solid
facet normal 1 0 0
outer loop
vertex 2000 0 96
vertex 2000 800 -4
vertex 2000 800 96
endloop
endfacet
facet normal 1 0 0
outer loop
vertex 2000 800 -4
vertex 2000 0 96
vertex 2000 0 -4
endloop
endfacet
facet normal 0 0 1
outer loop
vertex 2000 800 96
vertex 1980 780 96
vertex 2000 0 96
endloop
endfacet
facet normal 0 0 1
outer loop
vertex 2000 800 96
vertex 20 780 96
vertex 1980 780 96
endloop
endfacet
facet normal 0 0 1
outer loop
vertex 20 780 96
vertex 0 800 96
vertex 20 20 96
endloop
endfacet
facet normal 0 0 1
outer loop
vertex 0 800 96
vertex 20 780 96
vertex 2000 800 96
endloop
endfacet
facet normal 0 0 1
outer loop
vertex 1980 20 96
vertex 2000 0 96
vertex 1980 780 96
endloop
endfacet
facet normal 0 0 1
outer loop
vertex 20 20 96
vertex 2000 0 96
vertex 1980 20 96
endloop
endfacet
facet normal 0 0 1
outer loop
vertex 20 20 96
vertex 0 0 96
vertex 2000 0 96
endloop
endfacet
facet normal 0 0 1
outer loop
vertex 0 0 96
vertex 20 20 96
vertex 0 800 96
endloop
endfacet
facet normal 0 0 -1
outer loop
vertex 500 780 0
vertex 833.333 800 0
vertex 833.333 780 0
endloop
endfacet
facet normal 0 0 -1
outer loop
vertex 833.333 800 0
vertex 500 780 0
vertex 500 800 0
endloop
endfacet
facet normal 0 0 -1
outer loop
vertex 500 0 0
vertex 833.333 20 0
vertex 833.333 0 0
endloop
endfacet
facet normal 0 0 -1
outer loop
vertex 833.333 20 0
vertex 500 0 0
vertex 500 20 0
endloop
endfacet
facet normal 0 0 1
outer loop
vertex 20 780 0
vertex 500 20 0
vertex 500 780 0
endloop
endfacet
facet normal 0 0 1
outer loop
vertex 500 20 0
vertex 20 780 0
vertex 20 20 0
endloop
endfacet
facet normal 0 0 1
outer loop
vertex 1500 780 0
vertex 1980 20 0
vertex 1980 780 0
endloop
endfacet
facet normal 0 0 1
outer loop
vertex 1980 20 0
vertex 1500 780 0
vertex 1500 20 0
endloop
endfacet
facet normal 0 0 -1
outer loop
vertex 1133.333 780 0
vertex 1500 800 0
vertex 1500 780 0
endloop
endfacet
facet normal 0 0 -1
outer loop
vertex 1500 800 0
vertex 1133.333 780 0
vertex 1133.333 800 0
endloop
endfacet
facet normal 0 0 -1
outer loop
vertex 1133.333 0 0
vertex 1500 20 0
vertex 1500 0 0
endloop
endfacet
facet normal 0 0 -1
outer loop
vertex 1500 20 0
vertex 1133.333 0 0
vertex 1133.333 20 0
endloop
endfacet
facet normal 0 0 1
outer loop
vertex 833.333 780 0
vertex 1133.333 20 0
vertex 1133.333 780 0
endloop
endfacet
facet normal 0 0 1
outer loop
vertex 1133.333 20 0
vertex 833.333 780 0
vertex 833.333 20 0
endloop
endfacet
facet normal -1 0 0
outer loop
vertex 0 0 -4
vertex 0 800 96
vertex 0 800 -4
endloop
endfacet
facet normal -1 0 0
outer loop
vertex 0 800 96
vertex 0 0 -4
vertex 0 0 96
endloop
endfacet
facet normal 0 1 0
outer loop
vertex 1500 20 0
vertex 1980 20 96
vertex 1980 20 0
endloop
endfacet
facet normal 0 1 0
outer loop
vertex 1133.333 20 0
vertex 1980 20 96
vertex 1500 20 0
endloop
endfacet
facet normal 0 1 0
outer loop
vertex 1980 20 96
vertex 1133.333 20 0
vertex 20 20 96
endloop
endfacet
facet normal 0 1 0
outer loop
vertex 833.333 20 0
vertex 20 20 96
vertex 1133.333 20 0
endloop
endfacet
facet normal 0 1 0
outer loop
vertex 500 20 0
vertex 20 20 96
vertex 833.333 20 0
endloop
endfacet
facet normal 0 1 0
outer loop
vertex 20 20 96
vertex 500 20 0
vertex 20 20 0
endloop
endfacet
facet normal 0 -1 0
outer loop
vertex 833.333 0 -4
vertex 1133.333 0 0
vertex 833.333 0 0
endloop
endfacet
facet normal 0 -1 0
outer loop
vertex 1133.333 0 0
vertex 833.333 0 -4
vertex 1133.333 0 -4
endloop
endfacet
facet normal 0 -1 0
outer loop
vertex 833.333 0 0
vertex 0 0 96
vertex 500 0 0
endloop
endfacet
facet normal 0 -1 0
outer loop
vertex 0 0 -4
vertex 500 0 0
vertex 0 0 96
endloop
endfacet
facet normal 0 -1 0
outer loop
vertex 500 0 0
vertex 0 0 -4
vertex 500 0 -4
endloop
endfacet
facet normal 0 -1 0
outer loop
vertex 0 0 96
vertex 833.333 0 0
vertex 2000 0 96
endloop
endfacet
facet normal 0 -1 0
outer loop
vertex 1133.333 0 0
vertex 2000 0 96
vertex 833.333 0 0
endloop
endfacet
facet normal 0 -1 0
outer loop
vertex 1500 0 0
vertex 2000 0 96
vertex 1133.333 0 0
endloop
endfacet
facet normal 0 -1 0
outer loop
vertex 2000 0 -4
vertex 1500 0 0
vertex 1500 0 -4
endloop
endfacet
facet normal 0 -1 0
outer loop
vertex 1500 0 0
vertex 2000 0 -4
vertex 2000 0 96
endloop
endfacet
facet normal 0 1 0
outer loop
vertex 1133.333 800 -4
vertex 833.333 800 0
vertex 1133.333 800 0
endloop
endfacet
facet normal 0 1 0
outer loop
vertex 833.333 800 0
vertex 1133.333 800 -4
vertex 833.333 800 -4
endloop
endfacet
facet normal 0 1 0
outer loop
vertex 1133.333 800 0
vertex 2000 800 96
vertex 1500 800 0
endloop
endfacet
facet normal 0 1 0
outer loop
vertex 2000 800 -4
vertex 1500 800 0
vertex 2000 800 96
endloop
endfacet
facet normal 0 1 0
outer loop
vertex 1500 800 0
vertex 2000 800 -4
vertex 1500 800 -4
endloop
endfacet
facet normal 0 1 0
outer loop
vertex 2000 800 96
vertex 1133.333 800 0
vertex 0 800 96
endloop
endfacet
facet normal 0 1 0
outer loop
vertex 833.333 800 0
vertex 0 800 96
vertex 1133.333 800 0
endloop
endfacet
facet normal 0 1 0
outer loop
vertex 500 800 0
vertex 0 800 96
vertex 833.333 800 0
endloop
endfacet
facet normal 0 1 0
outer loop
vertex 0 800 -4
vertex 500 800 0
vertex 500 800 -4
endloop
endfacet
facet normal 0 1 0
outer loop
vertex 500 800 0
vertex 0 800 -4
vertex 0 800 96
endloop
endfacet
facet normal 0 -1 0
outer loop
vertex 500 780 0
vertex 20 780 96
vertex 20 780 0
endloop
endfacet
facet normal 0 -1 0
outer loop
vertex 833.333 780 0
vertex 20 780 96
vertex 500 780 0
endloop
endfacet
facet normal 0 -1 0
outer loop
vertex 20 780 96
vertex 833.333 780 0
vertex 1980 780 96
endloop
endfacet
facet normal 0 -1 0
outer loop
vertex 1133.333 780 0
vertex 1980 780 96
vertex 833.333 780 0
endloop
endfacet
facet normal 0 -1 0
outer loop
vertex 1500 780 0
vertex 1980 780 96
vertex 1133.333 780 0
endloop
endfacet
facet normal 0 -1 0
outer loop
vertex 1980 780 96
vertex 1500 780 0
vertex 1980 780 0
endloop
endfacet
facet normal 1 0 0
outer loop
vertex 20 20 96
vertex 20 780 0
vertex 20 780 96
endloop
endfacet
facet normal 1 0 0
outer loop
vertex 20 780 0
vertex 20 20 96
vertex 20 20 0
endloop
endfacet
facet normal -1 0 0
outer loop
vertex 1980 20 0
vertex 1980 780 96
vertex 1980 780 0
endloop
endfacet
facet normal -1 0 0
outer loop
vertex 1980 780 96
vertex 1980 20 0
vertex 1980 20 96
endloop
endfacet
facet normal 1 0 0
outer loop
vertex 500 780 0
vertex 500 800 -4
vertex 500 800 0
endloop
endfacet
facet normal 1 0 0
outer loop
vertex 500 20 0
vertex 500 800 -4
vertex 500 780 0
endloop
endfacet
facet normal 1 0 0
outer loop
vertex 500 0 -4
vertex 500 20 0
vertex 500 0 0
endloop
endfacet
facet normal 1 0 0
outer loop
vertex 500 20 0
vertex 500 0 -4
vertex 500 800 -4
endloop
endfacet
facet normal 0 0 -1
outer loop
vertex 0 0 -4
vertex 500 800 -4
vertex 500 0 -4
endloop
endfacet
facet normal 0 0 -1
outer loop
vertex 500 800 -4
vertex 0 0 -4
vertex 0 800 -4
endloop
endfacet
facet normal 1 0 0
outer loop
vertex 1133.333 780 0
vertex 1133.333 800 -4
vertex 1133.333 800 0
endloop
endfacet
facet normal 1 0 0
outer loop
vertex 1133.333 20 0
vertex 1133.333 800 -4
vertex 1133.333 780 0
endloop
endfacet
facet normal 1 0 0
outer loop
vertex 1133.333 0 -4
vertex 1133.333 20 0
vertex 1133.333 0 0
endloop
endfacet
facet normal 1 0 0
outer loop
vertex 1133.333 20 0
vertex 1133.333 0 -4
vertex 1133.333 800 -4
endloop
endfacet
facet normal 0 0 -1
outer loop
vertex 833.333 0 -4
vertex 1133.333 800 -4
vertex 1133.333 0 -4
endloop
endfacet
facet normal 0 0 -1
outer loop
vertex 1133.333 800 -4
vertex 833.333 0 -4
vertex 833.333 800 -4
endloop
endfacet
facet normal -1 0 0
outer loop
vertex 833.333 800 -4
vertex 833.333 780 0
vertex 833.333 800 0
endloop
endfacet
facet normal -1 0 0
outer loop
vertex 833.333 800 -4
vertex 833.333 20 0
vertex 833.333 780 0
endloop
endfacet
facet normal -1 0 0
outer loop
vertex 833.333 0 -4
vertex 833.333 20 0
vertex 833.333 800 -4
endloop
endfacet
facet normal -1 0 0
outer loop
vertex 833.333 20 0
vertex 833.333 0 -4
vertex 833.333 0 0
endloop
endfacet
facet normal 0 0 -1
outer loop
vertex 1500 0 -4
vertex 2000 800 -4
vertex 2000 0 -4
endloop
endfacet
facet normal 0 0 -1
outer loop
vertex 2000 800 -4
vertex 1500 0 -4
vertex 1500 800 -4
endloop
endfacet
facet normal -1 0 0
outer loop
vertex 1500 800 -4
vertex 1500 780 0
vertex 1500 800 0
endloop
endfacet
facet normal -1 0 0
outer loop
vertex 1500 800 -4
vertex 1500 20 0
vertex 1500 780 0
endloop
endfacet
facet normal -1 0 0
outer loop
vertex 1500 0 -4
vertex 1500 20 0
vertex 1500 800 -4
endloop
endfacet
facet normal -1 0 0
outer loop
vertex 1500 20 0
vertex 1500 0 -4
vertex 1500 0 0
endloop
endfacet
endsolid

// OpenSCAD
// My dictionary of this project
	// length (or Y-axis size) = L;
	// width (or X-axis size) = W;
	// hight (or Z-axis size) = H;

	// X-axis shift = dX (from windom to door);
	// Y-axis shift = dY (view the window from right to left);
	// Z-axis shift = dZ (from floor to ceiling);

	// color = clr;

	// stick = ST; plywood = PW; Bad = BD;
	
//====================================================
// draw one stick

ST_clr = "yellow";
ST_size = 50;
ST_W = 20;
ST_H = 96;

module ST_draw(length){
	color(ST_clr, 1)
	cube([length, ST_W, ST_H]);
}

//====================================================
// draw anover stick


//====================================================
// draw one plywood

PW_clr = "red";
PW_H = 4;

module PW_draw(length, width){
	color(PW_clr, 1)
	cube([length, width, PW_H]);
}

//====================================================
// draw bad

module BD_draw(){

// draw frame
l1 = 2000;
l2 = 800 - 2 * ST_W;

ST_draw(l1);
translate([0, l2 + ST_W, 0])
	ST_draw(l1);
translate([ST_W, ST_W, 0])
	rotate([0, 0, 90])
		ST_draw(l2);
translate([l1, ST_W, 0])
	rotate([0, 0, 90])
		ST_draw(l2);

// draw plywood
x = 500;
y = 800;
translate([0, 0, -PW_H])
	PW_draw(x, y);
translate([l1/2-x/3, 0, -PW_H])
	PW_draw(300, y);
translate([l1-x, 0, -PW_H])
	PW_draw(x, y);
}

//====================================================
//
BD_draw();
